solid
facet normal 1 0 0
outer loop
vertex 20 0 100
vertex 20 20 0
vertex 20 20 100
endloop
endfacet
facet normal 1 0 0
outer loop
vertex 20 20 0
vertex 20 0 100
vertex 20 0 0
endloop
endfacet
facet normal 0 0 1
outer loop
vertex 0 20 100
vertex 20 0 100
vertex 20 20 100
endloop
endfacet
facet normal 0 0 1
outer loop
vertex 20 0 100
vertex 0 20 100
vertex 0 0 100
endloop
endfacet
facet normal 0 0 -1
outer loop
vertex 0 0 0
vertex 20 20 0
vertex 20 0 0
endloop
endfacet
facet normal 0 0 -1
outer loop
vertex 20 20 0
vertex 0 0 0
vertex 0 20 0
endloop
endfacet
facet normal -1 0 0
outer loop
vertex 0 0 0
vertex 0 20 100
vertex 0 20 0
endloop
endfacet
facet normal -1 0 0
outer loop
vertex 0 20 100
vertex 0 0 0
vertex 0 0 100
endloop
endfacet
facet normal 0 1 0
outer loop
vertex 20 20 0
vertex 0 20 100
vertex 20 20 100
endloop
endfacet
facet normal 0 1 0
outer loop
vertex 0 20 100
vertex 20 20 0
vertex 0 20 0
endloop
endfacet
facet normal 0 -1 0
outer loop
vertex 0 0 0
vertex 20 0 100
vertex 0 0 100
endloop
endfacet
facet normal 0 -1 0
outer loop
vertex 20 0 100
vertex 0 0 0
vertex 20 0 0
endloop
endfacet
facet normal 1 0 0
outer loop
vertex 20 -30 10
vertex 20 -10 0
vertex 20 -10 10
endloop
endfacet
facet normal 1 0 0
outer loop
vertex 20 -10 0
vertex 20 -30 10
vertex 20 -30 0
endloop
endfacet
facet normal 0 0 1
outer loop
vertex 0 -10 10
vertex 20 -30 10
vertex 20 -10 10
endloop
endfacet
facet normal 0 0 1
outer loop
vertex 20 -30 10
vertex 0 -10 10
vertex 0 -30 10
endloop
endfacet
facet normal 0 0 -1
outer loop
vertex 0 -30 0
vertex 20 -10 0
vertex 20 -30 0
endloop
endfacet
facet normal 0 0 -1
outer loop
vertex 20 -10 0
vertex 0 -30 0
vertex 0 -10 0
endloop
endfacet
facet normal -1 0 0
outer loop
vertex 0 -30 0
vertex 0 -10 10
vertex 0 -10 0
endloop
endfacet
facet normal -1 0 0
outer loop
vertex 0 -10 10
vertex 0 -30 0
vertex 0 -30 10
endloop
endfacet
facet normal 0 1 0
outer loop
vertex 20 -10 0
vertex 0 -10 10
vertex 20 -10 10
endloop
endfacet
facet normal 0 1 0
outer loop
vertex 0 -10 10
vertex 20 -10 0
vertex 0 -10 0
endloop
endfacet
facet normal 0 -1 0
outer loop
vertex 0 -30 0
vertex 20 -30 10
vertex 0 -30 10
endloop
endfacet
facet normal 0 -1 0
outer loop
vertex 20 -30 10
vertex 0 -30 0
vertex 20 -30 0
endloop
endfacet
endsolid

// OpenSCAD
lightHeight = 100;

slatWidth = 40;
slatHeight = 5;
slatAngle = 30;

slatCountFront = 3;
slatCountSide = 3;

/*
Place a hole for screw on bottom.
Is needed when you install a bottom plate.
*/
screwBottom = "yes";

module branch() {
  cube([20,20,10]);
};

module top() {
    
};

module body() {
  cube([20,20,lightHeight]);
};

module main() {
  body();
  translate([0,-30,0]) {
    branch(); 
  };
};

main();
